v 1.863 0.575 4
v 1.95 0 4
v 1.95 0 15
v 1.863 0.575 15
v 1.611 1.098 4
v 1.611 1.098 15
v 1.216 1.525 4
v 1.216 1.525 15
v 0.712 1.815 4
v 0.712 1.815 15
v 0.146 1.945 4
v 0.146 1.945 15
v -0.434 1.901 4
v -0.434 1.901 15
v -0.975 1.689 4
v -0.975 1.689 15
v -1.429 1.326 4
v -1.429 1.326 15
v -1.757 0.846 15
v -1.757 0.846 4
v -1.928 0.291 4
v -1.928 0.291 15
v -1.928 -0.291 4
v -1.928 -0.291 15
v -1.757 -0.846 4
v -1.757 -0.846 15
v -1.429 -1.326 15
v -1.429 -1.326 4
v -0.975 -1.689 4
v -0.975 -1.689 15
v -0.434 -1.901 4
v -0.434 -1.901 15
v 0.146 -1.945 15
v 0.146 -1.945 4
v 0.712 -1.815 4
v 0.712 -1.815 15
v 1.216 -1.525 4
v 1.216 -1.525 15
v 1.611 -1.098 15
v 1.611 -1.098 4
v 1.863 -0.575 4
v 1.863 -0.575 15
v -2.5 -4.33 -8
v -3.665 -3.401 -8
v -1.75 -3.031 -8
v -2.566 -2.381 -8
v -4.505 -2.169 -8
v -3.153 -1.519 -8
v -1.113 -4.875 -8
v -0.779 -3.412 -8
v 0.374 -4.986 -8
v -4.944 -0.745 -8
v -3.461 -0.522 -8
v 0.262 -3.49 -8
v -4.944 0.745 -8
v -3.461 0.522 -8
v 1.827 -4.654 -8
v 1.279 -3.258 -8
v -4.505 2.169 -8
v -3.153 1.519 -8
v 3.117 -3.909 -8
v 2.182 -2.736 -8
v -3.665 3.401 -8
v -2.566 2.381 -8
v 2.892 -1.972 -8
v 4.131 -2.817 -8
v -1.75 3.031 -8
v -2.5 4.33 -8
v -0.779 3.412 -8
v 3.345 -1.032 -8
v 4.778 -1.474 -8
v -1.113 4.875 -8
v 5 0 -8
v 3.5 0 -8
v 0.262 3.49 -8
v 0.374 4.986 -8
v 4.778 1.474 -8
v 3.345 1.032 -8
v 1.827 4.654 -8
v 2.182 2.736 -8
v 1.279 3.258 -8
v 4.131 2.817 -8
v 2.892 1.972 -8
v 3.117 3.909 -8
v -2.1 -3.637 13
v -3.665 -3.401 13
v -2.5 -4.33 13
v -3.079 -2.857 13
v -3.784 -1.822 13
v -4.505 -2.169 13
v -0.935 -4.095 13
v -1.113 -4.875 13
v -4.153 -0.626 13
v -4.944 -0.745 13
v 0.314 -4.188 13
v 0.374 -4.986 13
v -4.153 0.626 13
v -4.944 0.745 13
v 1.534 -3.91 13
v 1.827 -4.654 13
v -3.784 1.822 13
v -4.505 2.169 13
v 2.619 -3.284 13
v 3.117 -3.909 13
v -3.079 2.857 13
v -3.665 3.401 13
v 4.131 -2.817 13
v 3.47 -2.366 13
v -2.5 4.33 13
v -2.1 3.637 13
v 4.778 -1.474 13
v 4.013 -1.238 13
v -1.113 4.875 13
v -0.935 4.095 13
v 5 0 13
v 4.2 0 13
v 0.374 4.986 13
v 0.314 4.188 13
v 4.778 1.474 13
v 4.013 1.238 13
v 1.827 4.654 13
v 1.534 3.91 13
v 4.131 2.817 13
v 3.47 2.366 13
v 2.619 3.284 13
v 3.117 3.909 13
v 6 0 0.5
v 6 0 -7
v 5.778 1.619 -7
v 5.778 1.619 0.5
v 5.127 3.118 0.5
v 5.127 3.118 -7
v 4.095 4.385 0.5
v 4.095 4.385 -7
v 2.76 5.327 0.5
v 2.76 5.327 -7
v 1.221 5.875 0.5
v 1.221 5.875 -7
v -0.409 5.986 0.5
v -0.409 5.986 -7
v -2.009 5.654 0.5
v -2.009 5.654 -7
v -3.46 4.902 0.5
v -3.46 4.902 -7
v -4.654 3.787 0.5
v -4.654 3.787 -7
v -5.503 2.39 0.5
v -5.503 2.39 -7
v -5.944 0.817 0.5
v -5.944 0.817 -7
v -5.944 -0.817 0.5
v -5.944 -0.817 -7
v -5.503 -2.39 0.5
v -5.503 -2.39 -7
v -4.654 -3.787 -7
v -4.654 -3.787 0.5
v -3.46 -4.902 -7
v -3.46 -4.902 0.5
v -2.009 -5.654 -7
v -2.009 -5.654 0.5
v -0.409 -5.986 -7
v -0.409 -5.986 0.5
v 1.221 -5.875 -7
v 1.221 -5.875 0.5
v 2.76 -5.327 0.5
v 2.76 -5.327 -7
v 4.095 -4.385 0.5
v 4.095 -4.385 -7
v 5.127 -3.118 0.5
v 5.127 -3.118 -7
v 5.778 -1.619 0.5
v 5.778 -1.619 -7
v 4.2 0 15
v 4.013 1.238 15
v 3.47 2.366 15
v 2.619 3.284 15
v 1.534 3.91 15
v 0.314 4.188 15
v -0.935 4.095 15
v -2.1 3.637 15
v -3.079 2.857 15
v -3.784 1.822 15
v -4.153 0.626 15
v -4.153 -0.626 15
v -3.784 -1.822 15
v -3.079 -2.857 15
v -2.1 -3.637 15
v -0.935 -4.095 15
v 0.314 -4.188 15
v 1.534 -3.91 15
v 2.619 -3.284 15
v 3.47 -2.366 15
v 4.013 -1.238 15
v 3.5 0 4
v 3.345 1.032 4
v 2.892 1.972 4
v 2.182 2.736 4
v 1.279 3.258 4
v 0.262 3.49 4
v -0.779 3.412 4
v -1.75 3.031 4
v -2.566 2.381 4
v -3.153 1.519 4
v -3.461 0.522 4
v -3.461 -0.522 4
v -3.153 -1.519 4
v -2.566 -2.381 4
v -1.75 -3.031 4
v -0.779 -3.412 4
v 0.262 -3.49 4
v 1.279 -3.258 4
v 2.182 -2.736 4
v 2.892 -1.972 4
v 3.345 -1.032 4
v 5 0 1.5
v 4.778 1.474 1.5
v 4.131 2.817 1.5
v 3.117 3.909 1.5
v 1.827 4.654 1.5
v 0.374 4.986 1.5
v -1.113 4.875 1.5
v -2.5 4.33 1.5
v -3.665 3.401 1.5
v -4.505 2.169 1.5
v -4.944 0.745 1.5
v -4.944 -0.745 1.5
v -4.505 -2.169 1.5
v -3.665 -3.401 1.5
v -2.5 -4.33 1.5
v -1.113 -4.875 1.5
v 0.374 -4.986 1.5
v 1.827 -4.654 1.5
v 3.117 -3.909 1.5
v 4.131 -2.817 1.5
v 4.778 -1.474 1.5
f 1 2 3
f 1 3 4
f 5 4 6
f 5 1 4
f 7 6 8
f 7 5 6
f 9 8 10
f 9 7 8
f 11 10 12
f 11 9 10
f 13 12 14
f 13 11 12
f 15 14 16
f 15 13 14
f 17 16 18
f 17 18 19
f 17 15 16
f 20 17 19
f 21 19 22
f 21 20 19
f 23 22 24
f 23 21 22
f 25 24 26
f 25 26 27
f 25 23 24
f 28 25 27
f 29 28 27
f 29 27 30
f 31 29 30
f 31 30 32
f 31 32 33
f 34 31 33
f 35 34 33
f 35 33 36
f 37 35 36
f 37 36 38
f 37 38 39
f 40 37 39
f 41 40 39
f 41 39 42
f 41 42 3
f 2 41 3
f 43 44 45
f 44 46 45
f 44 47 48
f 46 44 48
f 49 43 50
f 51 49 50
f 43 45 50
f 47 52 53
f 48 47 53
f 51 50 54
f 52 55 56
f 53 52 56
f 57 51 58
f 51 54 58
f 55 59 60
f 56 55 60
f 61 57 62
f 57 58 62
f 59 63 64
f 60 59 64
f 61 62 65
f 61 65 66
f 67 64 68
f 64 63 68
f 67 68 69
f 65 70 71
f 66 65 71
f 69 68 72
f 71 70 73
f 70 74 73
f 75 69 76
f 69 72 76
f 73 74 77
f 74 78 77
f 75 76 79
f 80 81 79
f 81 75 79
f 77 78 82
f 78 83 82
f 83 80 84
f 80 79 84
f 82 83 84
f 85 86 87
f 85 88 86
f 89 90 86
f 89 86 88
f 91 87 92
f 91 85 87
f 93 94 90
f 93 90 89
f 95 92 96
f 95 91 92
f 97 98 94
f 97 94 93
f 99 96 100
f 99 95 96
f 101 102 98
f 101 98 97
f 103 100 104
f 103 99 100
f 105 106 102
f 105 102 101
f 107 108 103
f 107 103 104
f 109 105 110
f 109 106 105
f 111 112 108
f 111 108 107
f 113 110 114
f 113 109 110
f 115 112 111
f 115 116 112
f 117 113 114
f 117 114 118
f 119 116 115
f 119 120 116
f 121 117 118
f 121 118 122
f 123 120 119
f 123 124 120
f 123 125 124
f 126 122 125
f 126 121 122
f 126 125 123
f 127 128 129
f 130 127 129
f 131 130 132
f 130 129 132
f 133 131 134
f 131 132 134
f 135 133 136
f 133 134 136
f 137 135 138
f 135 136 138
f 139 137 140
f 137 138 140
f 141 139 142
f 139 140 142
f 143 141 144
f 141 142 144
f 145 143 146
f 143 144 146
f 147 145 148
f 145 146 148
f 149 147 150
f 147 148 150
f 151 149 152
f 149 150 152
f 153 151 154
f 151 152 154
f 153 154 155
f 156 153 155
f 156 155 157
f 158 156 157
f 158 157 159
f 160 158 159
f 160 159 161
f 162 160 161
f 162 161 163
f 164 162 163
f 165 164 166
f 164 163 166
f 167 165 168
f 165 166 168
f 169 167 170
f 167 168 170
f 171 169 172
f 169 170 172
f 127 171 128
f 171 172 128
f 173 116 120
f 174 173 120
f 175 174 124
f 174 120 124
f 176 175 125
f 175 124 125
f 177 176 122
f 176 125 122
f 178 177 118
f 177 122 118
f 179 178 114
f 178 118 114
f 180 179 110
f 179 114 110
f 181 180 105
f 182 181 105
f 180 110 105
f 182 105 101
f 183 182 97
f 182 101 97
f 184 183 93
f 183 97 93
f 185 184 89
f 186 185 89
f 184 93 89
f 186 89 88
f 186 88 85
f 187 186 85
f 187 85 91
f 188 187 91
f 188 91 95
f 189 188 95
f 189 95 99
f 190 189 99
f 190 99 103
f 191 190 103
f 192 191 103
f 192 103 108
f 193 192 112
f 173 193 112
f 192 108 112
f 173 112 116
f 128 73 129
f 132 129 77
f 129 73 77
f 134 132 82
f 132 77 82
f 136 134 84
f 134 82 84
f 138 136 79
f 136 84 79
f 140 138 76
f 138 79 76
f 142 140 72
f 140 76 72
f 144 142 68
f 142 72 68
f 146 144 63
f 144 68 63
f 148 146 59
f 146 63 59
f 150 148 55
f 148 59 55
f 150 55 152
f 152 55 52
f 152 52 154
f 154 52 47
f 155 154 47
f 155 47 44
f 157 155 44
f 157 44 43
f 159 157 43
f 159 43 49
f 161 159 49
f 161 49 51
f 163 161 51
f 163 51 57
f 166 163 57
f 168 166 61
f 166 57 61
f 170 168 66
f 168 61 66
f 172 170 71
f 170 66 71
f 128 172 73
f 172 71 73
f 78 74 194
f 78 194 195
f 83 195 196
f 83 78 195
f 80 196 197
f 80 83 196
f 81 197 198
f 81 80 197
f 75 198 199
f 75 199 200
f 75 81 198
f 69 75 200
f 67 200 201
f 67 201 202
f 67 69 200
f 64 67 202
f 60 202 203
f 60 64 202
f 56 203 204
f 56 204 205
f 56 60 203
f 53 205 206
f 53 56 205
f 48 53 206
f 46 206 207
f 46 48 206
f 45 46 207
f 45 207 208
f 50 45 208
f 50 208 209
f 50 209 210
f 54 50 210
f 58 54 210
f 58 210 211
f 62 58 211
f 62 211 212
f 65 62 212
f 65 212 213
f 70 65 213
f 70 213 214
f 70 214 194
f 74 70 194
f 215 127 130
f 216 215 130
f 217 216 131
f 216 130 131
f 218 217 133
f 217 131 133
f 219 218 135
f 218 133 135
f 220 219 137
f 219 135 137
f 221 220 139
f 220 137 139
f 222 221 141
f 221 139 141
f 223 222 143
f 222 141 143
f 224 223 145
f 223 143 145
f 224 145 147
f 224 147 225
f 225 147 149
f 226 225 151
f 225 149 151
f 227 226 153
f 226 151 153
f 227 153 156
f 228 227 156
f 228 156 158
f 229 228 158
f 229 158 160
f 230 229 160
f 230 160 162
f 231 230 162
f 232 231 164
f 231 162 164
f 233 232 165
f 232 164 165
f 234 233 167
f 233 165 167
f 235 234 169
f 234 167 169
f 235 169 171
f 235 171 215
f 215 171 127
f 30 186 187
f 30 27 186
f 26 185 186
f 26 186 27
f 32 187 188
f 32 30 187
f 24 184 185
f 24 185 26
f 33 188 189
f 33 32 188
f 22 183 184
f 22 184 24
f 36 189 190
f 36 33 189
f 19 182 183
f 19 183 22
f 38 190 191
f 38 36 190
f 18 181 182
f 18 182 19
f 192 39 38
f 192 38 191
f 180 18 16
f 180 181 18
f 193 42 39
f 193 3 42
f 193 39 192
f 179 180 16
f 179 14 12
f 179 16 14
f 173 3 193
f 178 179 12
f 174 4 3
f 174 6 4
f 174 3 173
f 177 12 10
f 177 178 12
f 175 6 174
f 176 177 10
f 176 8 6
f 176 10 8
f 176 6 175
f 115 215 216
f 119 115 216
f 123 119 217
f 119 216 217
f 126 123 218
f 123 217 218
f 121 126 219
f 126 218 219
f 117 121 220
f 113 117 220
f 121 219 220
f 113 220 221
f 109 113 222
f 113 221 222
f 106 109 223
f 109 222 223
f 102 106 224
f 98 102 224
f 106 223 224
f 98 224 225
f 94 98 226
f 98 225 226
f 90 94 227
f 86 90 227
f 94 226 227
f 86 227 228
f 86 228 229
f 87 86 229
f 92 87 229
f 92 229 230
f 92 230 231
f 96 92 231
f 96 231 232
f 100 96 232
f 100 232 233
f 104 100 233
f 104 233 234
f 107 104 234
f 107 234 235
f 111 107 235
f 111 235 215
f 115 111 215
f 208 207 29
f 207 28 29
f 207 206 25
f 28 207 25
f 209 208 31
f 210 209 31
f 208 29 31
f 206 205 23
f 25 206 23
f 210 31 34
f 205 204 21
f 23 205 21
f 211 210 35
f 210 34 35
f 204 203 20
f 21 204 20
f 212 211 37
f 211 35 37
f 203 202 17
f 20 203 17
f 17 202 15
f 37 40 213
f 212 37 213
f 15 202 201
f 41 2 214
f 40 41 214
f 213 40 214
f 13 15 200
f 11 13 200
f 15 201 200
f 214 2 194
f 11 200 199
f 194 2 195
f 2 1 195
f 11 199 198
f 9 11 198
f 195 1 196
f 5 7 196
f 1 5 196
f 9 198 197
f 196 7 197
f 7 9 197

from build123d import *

# Parameters (mm, degrees)
SKETCH_1_R          = 5
SKETCH_1_R_2        = 1.95
EXTRUDE_1_DEPTH     = 15
SKETCH_3_R          = 3.5
CUT_EXTRUDE_1_DEPTH = 4
EXTRUDE_START       = -8
SKETCH_4_R          = 6
SKETCH_4_R_2        = 3.5
EXTRUDE_2_DEPTH     = 8
CHAMFER_1_SIZE      = 1.5
CHAMFER_2_SIZE      = 1
CUT_EXTRUDE_START   = -2
SKETCH_9_R          = 5
SKETCH_9_R_2        = 4.2
CUT_EXTRUDE_4_DEPTH = 2


with BuildPart() as part:
    # 스케치1 → 보스-돌출1 (new body)
    with BuildSketch(Plane.XY):
        Circle(SKETCH_1_R)
        Circle(SKETCH_1_R_2, mode=Mode.SUBTRACT)
    extrude(amount=EXTRUDE_1_DEPTH)

    # 스케치3 → 컷-돌출1 (cut)
    with BuildSketch(Plane.XY):
        Circle(SKETCH_3_R)
    extrude(amount=CUT_EXTRUDE_1_DEPTH, mode=Mode.SUBTRACT)

    # 스케치4 → 보스-돌출2 (add)
    with BuildSketch(Plane.XY.offset(EXTRUDE_START)):
        Circle(SKETCH_4_R)
        Circle(SKETCH_4_R_2, mode=Mode.SUBTRACT)
    extrude(amount=EXTRUDE_2_DEPTH)

    # 모따기1
    # the kernel refuses this chamfer: 1.5 mm, written as the material it adds along each edge
    with BuildSketch(Plane(origin=(0, 0, 0), x_dir=(1, 0, 0), z_dir=(0, -1, 0))) as chamfer_1_piece_1_section:
        Polygon((5, CHAMFER_1_SIZE), (5 + CHAMFER_1_SIZE, 0), (5, 0), align=None)
    chamfer_1_piece_1 = revolve(axis=Axis((0, 0, 0), (0, 0, 1)), mode=Mode.PRIVATE)
    chamfer_1_piece_1 = chamfer_1_piece_1 & Plane(origin=(0, 0, 0.997696527), x_dir=(1, 0, 0), z_dir=(0, 0, -1)) * Cylinder(6, 26, mode=Mode.PRIVATE)
    add(chamfer_1_piece_1)

    # 모따기2
    chamfer_2_edges = [part.edges().sort_by_distance(p)[0] for p in [
        (-6, 0, -8),
    ]]
    chamfer(chamfer_2_edges, length=CHAMFER_2_SIZE)

    # 스케치9 → 컷-돌출4 (cut)
    with BuildSketch(Plane.XY.offset(15).offset(CUT_EXTRUDE_START)):
        Circle(SKETCH_9_R)
        Circle(SKETCH_9_R_2, mode=Mode.SUBTRACT)
    extrude(amount=CUT_EXTRUDE_4_DEPTH, mode=Mode.SUBTRACT)


solid = part.part
